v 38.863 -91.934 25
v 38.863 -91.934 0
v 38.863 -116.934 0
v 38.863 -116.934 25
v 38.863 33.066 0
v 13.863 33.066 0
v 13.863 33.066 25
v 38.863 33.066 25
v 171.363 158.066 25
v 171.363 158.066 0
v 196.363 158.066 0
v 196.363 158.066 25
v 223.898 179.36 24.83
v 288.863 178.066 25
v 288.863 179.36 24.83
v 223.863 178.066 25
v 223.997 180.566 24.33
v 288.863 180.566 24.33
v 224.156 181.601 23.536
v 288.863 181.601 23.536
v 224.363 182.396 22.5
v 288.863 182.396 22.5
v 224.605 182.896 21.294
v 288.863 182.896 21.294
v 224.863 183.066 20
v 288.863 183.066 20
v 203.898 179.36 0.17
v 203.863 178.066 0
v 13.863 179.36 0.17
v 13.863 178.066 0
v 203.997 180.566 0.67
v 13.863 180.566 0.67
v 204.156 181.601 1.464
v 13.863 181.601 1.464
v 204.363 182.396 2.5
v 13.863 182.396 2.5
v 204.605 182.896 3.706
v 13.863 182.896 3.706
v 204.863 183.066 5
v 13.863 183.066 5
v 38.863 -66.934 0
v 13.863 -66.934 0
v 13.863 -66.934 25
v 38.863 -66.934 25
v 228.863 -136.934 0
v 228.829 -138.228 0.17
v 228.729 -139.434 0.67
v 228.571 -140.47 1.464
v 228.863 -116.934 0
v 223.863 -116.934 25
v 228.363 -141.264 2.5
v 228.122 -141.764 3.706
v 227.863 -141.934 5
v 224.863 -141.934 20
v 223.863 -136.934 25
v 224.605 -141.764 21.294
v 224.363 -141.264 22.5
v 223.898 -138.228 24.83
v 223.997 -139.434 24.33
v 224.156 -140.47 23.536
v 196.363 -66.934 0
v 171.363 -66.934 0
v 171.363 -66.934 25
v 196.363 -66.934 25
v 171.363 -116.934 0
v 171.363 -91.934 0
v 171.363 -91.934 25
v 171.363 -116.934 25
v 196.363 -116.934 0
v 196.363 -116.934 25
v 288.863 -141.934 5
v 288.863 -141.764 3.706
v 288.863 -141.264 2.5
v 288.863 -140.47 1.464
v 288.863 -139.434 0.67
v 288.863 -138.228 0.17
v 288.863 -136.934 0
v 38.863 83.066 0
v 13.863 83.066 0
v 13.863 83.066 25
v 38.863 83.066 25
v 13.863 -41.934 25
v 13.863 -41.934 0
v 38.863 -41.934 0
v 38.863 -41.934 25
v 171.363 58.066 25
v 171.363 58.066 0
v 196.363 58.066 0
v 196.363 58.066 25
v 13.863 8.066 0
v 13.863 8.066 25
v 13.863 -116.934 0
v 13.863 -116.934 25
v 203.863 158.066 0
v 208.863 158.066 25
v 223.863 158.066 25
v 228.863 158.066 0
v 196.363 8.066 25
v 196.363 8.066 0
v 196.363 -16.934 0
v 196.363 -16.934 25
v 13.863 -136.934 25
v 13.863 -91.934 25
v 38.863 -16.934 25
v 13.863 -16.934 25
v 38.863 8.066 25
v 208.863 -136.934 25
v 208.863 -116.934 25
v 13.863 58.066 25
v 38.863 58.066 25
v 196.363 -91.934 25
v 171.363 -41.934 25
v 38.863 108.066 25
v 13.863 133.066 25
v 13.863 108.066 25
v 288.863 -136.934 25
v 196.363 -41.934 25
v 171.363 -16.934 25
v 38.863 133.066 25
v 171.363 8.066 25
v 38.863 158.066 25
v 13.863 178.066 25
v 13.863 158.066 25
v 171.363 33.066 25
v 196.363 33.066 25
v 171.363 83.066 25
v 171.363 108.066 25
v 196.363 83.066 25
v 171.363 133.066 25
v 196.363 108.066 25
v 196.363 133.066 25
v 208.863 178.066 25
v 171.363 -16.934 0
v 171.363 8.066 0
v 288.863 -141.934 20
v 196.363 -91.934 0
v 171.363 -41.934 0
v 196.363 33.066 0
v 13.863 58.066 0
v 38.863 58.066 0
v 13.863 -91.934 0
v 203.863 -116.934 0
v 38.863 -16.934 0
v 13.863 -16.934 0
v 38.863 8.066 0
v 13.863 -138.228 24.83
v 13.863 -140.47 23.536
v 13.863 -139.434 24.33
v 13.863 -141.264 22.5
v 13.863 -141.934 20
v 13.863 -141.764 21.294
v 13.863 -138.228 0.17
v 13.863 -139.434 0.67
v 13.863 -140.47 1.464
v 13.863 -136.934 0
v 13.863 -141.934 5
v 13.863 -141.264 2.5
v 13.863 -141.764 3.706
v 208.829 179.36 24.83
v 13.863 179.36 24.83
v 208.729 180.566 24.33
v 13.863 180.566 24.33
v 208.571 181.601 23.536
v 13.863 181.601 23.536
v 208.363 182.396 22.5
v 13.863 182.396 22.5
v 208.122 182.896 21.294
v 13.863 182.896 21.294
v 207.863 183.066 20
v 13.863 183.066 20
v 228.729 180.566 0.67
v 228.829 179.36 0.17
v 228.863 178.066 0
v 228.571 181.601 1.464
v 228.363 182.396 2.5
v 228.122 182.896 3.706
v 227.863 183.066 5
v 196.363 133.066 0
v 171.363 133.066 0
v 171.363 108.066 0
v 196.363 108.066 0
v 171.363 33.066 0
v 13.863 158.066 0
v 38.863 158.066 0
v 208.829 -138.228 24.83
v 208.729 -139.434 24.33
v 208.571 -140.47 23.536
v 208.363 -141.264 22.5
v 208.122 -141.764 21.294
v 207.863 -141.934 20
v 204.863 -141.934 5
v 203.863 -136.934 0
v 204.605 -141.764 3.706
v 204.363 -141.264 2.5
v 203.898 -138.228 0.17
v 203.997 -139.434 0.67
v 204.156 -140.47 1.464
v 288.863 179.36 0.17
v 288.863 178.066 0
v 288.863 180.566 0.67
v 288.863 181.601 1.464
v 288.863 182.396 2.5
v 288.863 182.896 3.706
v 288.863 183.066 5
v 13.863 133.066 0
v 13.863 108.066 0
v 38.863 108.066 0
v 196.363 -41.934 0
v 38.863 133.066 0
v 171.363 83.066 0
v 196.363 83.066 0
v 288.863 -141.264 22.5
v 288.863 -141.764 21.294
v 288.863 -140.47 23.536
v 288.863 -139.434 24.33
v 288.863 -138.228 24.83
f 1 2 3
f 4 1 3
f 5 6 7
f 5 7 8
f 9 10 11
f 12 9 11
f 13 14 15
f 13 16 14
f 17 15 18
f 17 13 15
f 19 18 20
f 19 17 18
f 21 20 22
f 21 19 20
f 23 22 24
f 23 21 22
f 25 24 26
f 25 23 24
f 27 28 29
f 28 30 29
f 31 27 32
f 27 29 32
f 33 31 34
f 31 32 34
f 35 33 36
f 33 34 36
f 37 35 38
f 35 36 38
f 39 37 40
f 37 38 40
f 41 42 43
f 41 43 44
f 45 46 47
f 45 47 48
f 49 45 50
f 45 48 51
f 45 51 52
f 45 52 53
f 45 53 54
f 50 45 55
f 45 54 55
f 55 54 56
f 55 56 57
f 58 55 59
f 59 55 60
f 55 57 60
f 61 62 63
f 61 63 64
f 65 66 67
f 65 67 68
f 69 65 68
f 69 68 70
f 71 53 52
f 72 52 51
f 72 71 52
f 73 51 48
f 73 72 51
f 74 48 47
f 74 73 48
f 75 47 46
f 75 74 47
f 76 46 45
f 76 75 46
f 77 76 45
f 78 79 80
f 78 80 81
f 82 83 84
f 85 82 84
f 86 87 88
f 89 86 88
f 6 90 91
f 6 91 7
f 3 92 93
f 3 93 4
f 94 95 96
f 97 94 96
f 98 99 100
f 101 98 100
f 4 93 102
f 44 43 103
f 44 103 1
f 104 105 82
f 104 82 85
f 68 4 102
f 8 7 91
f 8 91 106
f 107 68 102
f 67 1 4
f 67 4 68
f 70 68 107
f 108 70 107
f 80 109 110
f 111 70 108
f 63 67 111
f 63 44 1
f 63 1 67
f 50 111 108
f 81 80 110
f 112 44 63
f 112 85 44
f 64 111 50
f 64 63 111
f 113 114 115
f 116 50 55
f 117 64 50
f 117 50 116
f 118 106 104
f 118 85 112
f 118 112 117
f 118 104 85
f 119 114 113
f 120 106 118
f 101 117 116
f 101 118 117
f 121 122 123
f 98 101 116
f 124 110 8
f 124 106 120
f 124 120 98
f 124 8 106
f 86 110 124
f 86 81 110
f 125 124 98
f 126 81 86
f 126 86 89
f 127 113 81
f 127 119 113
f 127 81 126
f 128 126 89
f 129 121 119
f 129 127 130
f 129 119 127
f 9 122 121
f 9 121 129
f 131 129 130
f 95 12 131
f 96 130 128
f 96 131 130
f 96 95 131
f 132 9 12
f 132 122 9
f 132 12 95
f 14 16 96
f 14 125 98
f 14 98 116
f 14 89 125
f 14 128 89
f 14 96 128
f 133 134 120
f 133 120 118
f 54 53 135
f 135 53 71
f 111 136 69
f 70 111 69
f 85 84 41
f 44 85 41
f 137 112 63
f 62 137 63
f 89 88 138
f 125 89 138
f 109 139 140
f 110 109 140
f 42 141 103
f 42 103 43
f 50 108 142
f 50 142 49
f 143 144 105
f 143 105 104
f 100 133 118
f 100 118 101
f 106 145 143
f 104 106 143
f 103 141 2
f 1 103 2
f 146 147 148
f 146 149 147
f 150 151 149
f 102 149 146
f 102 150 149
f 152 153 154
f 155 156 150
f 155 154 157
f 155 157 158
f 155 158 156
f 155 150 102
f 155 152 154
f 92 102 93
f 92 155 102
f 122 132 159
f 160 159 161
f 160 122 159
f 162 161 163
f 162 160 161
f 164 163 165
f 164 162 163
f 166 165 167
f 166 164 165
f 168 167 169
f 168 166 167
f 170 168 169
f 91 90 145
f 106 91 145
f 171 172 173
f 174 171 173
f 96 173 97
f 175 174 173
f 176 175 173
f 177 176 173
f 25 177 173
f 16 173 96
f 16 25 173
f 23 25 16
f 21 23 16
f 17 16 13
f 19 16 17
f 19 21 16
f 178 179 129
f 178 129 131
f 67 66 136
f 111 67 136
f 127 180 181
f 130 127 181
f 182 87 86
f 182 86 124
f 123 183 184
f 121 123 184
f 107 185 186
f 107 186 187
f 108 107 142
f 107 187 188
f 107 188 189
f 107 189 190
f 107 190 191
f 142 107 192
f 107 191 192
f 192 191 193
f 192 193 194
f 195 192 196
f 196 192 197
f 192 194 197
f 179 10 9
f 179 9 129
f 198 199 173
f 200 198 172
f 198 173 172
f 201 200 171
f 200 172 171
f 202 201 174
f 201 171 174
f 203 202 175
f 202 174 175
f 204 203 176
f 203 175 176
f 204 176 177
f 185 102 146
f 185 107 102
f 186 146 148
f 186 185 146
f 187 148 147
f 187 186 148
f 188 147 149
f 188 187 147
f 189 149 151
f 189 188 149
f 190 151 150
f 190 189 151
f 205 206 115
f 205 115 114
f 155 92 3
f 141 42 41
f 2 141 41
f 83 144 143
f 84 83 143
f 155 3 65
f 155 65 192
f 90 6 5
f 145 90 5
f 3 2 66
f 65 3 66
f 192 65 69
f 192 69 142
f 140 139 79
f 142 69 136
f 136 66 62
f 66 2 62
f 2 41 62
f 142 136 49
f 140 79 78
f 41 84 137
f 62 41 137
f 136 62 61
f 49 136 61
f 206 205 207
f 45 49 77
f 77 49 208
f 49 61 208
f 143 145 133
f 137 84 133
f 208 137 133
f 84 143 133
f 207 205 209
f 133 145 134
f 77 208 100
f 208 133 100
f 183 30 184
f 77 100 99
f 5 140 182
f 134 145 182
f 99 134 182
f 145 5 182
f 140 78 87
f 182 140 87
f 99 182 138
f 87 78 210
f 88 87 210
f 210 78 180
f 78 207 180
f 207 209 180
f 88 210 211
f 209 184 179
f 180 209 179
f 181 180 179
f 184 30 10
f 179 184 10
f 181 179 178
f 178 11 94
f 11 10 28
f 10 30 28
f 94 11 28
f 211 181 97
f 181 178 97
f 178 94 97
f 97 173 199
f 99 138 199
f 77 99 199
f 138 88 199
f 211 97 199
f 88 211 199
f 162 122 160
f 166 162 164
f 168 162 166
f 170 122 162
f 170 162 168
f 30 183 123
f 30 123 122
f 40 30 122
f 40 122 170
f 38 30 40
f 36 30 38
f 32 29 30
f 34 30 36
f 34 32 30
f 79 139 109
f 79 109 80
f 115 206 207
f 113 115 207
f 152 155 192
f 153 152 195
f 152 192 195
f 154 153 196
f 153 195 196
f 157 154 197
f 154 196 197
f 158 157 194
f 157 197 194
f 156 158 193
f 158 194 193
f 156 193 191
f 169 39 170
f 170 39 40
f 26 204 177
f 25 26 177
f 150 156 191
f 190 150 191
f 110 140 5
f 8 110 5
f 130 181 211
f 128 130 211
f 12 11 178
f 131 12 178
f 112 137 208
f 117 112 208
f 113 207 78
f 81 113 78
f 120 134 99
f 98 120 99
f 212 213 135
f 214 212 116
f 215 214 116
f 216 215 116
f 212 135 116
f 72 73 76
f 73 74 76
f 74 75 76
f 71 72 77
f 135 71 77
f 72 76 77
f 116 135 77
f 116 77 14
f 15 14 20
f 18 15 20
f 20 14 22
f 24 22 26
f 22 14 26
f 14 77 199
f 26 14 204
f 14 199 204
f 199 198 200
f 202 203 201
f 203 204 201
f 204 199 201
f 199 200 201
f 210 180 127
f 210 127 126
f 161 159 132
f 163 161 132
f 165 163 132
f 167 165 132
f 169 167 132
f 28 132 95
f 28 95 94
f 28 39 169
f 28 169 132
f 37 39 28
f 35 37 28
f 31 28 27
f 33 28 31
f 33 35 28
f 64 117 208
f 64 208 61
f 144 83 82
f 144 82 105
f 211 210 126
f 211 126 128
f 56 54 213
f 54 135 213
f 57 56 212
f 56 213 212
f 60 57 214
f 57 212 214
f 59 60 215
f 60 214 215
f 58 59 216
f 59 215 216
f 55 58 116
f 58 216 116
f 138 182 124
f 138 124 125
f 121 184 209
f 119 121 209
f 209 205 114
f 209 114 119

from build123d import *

# Parameters (mm, degrees)
F0_W      = 25
F0_H      = 25
F1_DEPTH  = 25
F3_DEPTH  = 25
F9_W      = 25
F9_H      = 25
F10_DEPTH = 25
F11_R     = 5
F12_R     = 5


with BuildPart() as f1:
    # F0 (on Top) → F1 (new body)
    with BuildSketch(Plane.XY):
        Polygon((38.8634320385, -116.9341091547), (38.8634320385, -141.9341091547), (288.8634320385, -141.9341091547), (288.8634320385, 183.0658908453), (38.8634320385, 183.0658908453), (38.8634320385, 158.0658908453), (38.8634320385, 133.0658908453), (38.8634320385, 108.0658908453), (38.8634320385, 83.0658908453), (38.8634320385, 58.0658908453), (38.8634320385, 33.0658908453), (38.8634320385, 8.0658908453), (38.8634320385, -16.9341091547), (38.8634320385, -41.9341091547), (38.8634320385, -66.9341091547), (38.8634320385, -91.9341091547), align=None)
        with Locations((26.3634320385, -129.4341091547)):
            Rectangle(F0_W, F0_H)
        with Locations((26.3634320385, -79.4341091547)):
            Rectangle(F0_W, F0_H)
        with Locations((26.3634320385, -29.4341091547)):
            Rectangle(F0_W, F0_H)
        with Locations((26.3634320385, 20.5658908453)):
            Rectangle(F0_W, F0_H)
        with Locations((26.3634320385, 70.5658908453)):
            Rectangle(F0_W, F0_H)
        with Locations((26.3634320385, 120.5658908453)):
            Rectangle(F0_W, F0_H)
        with Locations((26.3634320385, 170.5658908453)):
            Rectangle(F0_W, F0_H)
    extrude(amount=F1_DEPTH)

    # F2 (on face) → F3 (cut)
    with BuildSketch(Plane.XZ.offset(141.9341091547)):
        Polygon((208.8634320385, 25), (203.8634320385, 0), (228.8634320385, 0), (223.8634320385, 25), align=None)
    extrude(amount=-F3_DEPTH, mode=Mode.SUBTRACT)

    # F8: F1 across plane


with BuildPart() as f1_1:
    add(f1.part)
    add(f1.part.mirror(Plane(origin=(288.8634320385, 20.5658908453, 0), x_dir=(0, 0, 1), z_dir=(0, 1, 0))), mode=Mode.INTERSECT)

    # F9 (on face) → F10 (cut)
    with BuildSketch(Plane(origin=(0, 0, 0), x_dir=(1, 0, 0), z_dir=(0, 0, -1))):
        with Locations((183.8634320385, -145.5658908453)):
            Rectangle(F9_W, F9_H)
        with Locations((183.8634320385, -95.5658908453)):
            Rectangle(F9_W, F9_H)
        with Locations((183.8634320385, -45.5658908453)):
            Rectangle(F9_W, F9_H)
        with Locations((183.8634320385, 4.4341091547)):
            Rectangle(F9_W, F9_H)
        with Locations((183.8634320385, 54.4341091547)):
            Rectangle(F9_W, F9_H)
        with Locations((183.8634320385, 104.4341091547)):
            Rectangle(F9_W, F9_H)
    extrude(amount=-F10_DEPTH, mode=Mode.SUBTRACT)

    # F11
    f11_edges = [f1_1.edges().sort_by_distance(p)[0] for p in [
        (108.863432, -141.934109, 0),
        (111.363432, -141.934109, 25),
        (256.363432, -141.934109, 25),
        (258.863432, -141.934109, 0),
    ]]
    fillet(f11_edges, radius=F11_R)

    # F12
    f12_edges = [f1_1.edges().sort_by_distance(p)[0] for p in [
        (111.363432, 183.065891, 25),
        (108.863432, 183.065891, 0),
        (258.863432, 183.065891, 0),
        (256.363432, 183.065891, 25),
    ]]
    fillet(f12_edges, radius=F12_R)


solid = f1_1.part
